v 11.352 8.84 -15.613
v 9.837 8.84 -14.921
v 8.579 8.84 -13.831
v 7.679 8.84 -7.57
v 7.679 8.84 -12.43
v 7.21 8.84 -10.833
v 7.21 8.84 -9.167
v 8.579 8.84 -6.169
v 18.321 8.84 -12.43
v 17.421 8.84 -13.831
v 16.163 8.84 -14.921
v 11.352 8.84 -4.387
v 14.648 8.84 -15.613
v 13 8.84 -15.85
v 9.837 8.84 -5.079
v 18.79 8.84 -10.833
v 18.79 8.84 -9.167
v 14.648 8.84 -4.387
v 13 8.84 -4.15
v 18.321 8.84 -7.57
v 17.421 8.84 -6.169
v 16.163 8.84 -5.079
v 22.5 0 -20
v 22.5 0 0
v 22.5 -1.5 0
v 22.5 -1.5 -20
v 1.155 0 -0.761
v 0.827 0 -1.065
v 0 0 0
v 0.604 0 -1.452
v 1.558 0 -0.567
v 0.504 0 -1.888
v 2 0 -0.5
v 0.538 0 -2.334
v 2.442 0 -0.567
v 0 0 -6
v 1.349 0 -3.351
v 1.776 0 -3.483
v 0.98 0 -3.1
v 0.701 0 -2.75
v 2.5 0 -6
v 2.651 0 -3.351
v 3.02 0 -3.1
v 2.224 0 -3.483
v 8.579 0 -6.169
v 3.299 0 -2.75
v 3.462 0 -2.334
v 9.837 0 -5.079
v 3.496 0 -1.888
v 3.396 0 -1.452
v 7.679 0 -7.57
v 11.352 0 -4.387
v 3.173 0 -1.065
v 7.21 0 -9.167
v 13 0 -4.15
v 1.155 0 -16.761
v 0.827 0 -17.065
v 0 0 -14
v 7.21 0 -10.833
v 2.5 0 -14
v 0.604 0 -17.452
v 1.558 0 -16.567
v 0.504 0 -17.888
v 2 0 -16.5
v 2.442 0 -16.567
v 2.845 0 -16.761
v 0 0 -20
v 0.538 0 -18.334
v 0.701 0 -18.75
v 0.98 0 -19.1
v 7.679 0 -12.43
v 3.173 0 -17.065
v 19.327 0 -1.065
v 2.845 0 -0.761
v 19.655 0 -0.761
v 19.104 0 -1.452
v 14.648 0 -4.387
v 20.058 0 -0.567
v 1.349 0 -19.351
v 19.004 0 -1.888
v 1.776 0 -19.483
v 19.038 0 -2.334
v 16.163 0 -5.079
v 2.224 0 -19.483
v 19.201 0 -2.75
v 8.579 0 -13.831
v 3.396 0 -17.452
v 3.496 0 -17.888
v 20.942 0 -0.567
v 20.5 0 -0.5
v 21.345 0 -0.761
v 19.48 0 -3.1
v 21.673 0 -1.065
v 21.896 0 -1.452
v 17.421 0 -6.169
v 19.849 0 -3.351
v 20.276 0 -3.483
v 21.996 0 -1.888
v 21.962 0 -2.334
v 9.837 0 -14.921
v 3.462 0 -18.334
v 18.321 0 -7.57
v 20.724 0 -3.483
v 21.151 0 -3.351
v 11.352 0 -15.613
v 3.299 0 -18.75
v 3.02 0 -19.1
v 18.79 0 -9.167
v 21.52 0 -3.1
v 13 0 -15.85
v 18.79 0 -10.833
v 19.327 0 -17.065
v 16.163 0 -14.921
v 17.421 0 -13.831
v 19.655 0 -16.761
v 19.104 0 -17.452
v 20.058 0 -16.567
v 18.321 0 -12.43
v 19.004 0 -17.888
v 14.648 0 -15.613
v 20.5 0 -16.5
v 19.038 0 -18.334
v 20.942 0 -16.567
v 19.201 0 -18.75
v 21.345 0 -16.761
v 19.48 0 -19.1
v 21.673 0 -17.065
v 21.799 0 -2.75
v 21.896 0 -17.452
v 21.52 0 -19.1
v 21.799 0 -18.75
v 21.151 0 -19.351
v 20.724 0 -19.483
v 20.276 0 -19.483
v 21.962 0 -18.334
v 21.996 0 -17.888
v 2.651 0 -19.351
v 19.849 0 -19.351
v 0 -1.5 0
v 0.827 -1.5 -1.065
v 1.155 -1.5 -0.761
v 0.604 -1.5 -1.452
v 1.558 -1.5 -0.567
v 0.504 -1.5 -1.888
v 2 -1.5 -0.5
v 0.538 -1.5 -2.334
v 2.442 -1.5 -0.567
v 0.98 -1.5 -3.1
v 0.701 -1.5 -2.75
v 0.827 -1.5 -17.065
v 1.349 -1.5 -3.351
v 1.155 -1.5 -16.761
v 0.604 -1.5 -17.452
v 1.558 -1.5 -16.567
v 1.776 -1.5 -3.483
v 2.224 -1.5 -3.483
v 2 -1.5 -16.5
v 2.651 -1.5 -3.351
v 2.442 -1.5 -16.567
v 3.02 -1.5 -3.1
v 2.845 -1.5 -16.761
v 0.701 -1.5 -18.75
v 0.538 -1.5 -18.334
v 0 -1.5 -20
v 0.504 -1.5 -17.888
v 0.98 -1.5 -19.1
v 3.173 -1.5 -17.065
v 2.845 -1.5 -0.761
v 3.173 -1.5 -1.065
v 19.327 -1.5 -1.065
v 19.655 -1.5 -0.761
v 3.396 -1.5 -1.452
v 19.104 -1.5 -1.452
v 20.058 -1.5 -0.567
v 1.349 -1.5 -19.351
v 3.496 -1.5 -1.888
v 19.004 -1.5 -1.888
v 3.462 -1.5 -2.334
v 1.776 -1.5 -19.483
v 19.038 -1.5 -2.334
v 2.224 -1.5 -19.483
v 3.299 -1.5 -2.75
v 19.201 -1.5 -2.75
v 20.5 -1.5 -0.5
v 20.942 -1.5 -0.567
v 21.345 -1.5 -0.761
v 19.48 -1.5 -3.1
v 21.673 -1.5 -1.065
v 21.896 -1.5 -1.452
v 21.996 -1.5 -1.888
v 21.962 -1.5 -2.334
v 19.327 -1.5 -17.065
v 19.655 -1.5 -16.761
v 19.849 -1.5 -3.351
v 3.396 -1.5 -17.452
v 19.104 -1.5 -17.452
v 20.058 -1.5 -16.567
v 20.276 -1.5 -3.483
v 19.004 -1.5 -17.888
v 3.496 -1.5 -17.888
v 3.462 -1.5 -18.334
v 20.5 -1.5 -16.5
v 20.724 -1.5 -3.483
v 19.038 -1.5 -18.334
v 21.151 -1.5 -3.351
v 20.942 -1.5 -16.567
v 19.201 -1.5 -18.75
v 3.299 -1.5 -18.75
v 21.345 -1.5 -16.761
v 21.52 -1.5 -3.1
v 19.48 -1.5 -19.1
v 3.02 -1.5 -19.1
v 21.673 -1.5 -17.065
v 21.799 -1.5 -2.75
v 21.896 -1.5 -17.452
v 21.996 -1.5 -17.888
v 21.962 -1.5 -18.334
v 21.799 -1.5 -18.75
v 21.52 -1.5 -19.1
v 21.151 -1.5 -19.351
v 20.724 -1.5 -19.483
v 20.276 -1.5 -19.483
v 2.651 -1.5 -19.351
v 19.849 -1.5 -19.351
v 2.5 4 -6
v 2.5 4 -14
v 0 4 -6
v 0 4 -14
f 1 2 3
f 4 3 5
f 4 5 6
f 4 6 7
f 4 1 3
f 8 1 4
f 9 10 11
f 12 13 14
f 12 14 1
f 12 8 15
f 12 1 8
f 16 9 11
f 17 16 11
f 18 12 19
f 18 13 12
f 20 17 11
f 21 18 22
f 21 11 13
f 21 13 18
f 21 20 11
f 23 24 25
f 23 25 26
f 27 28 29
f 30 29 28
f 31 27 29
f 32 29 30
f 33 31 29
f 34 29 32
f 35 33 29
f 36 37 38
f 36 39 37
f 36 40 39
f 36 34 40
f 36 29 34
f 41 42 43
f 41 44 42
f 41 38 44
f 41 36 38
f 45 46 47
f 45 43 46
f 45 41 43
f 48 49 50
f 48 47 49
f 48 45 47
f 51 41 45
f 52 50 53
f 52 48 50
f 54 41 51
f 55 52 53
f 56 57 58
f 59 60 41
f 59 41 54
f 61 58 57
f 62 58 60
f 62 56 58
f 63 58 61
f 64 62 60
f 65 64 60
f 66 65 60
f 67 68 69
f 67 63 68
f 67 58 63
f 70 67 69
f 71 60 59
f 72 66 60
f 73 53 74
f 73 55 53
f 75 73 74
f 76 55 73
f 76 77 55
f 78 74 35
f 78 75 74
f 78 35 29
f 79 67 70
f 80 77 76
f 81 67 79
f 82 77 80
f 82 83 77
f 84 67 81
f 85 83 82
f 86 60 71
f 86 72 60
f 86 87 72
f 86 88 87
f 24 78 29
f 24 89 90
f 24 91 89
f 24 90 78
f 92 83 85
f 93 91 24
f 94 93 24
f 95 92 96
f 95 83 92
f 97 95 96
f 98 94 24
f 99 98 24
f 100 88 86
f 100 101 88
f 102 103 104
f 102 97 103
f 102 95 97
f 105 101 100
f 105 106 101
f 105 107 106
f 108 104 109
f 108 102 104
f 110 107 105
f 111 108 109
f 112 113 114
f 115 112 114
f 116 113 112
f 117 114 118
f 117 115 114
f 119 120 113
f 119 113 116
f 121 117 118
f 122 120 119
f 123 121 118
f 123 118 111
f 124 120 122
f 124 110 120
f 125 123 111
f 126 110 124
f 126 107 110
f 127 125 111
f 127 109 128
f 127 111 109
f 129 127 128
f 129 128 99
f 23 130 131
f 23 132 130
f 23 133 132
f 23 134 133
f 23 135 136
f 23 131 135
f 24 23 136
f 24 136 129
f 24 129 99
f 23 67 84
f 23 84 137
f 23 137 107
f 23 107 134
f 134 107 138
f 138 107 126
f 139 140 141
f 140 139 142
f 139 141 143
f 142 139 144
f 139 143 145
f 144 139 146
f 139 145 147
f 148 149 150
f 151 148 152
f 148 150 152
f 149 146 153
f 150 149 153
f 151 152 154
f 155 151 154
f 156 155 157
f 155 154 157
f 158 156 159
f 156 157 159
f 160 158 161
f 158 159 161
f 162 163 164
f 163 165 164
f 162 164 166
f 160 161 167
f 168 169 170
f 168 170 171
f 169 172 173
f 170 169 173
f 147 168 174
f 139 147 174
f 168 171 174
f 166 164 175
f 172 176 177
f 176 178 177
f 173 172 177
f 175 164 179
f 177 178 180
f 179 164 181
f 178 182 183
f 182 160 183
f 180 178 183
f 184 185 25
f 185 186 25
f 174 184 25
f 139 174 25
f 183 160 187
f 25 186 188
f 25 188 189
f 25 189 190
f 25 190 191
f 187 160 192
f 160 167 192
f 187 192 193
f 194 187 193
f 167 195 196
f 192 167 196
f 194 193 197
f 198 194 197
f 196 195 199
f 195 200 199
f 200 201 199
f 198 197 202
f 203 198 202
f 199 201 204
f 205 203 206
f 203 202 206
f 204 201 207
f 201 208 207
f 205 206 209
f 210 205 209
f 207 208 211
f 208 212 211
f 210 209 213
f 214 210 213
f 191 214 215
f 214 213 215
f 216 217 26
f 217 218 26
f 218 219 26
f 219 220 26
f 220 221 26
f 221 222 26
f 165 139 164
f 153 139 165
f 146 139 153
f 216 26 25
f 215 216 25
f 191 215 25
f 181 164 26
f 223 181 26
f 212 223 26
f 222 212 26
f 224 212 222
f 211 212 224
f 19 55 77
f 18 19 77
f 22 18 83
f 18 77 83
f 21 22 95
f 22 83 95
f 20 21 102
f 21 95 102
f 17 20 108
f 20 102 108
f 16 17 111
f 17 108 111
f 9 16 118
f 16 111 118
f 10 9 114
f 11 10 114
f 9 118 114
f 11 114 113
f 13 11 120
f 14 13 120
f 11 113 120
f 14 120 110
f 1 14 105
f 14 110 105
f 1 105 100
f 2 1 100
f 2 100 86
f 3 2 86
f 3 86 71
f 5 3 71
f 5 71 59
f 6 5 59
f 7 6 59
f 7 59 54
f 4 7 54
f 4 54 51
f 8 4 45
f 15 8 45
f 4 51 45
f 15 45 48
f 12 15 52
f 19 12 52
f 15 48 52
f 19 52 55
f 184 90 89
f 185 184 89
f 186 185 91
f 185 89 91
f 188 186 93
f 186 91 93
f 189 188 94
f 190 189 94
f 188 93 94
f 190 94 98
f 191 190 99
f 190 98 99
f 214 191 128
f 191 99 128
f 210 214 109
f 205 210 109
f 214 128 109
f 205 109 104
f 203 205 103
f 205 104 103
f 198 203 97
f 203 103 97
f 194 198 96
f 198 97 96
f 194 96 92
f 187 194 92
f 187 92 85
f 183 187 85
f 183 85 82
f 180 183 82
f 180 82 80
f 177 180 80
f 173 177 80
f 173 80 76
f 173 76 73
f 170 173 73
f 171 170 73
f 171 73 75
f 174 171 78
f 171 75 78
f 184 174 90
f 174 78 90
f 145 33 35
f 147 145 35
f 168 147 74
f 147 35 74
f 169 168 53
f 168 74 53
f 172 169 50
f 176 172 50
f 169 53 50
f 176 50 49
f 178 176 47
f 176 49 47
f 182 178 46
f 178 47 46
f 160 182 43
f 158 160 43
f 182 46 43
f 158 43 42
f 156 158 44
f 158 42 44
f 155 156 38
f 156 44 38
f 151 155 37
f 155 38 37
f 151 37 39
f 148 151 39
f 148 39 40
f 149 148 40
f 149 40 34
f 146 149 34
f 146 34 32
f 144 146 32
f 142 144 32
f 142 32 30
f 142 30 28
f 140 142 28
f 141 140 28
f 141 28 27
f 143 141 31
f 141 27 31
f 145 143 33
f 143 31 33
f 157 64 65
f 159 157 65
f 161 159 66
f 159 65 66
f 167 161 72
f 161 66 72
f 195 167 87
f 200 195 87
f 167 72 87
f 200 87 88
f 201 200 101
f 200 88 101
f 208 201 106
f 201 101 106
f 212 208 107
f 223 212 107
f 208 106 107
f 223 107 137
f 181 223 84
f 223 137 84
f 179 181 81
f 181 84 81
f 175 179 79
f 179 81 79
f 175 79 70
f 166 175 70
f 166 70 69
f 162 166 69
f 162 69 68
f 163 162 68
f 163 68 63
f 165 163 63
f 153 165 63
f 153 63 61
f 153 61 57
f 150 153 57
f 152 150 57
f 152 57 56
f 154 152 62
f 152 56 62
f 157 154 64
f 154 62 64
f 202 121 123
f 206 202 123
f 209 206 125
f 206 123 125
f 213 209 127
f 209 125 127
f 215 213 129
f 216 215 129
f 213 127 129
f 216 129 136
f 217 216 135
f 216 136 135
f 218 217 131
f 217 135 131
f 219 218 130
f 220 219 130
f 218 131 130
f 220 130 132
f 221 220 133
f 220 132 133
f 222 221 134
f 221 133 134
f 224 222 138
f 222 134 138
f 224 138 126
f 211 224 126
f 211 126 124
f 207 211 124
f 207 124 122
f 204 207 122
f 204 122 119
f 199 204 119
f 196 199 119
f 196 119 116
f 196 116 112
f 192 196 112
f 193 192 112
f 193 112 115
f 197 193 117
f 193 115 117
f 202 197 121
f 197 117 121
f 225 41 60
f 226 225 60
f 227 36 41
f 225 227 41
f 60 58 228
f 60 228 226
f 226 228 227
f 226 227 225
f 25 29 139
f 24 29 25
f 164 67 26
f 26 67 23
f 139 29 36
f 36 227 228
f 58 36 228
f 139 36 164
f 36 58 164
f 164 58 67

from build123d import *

# Parameters (mm, degrees)
SKETCH_1_W      = 22.5
SKETCH_1_H      = 20
SKETCH_1_R      = 1.5
EXTRUDE_1_DEPTH = 1.5
SKETCH_1_3_R    = 5.85
EXTRUDE_2_DEPTH = 8.84
SKETCH_1_4_W    = 2.5
SKETCH_1_4_H    = 8
EXTRUDE_3_DEPTH = 4


with BuildPart() as part:
    # 草图1 → 凸台-拉伸1 (new body)
    with BuildSketch(Plane(origin=(0, 0, 0), x_dir=(1, 0, 0), z_dir=(0, 1, 0))):
        with Locations((11.25, 10)):
            Rectangle(SKETCH_1_W, SKETCH_1_H)
        with Locations((2, 2)):
            Circle(SKETCH_1_R, mode=Mode.SUBTRACT)
        with Locations((20.5, 2)):
            Circle(SKETCH_1_R, mode=Mode.SUBTRACT)
        with Locations((2, 18)):
            Circle(SKETCH_1_R, mode=Mode.SUBTRACT)
        with Locations((20.5, 18)):
            Circle(SKETCH_1_R, mode=Mode.SUBTRACT)
    extrude(amount=-EXTRUDE_1_DEPTH)

    # 草图1<3> → 凸台-拉伸2 (add)
    with BuildSketch(Plane(origin=(0, 0, 0), x_dir=(1, 0, 0), z_dir=(0, 1, 0))):
        with Locations((13, 10)):
            Circle(SKETCH_1_3_R)
    extrude(amount=EXTRUDE_2_DEPTH)

    # 草图1<4> → 凸台-拉伸3 (add)
    with BuildSketch(Plane(origin=(0, 0, 0), x_dir=(1, 0, 0), z_dir=(0, 1, 0))):
        with Locations((1.25, 10)):
            Rectangle(SKETCH_1_4_W, SKETCH_1_4_H)
    extrude(amount=EXTRUDE_3_DEPTH)


solid = part.part
